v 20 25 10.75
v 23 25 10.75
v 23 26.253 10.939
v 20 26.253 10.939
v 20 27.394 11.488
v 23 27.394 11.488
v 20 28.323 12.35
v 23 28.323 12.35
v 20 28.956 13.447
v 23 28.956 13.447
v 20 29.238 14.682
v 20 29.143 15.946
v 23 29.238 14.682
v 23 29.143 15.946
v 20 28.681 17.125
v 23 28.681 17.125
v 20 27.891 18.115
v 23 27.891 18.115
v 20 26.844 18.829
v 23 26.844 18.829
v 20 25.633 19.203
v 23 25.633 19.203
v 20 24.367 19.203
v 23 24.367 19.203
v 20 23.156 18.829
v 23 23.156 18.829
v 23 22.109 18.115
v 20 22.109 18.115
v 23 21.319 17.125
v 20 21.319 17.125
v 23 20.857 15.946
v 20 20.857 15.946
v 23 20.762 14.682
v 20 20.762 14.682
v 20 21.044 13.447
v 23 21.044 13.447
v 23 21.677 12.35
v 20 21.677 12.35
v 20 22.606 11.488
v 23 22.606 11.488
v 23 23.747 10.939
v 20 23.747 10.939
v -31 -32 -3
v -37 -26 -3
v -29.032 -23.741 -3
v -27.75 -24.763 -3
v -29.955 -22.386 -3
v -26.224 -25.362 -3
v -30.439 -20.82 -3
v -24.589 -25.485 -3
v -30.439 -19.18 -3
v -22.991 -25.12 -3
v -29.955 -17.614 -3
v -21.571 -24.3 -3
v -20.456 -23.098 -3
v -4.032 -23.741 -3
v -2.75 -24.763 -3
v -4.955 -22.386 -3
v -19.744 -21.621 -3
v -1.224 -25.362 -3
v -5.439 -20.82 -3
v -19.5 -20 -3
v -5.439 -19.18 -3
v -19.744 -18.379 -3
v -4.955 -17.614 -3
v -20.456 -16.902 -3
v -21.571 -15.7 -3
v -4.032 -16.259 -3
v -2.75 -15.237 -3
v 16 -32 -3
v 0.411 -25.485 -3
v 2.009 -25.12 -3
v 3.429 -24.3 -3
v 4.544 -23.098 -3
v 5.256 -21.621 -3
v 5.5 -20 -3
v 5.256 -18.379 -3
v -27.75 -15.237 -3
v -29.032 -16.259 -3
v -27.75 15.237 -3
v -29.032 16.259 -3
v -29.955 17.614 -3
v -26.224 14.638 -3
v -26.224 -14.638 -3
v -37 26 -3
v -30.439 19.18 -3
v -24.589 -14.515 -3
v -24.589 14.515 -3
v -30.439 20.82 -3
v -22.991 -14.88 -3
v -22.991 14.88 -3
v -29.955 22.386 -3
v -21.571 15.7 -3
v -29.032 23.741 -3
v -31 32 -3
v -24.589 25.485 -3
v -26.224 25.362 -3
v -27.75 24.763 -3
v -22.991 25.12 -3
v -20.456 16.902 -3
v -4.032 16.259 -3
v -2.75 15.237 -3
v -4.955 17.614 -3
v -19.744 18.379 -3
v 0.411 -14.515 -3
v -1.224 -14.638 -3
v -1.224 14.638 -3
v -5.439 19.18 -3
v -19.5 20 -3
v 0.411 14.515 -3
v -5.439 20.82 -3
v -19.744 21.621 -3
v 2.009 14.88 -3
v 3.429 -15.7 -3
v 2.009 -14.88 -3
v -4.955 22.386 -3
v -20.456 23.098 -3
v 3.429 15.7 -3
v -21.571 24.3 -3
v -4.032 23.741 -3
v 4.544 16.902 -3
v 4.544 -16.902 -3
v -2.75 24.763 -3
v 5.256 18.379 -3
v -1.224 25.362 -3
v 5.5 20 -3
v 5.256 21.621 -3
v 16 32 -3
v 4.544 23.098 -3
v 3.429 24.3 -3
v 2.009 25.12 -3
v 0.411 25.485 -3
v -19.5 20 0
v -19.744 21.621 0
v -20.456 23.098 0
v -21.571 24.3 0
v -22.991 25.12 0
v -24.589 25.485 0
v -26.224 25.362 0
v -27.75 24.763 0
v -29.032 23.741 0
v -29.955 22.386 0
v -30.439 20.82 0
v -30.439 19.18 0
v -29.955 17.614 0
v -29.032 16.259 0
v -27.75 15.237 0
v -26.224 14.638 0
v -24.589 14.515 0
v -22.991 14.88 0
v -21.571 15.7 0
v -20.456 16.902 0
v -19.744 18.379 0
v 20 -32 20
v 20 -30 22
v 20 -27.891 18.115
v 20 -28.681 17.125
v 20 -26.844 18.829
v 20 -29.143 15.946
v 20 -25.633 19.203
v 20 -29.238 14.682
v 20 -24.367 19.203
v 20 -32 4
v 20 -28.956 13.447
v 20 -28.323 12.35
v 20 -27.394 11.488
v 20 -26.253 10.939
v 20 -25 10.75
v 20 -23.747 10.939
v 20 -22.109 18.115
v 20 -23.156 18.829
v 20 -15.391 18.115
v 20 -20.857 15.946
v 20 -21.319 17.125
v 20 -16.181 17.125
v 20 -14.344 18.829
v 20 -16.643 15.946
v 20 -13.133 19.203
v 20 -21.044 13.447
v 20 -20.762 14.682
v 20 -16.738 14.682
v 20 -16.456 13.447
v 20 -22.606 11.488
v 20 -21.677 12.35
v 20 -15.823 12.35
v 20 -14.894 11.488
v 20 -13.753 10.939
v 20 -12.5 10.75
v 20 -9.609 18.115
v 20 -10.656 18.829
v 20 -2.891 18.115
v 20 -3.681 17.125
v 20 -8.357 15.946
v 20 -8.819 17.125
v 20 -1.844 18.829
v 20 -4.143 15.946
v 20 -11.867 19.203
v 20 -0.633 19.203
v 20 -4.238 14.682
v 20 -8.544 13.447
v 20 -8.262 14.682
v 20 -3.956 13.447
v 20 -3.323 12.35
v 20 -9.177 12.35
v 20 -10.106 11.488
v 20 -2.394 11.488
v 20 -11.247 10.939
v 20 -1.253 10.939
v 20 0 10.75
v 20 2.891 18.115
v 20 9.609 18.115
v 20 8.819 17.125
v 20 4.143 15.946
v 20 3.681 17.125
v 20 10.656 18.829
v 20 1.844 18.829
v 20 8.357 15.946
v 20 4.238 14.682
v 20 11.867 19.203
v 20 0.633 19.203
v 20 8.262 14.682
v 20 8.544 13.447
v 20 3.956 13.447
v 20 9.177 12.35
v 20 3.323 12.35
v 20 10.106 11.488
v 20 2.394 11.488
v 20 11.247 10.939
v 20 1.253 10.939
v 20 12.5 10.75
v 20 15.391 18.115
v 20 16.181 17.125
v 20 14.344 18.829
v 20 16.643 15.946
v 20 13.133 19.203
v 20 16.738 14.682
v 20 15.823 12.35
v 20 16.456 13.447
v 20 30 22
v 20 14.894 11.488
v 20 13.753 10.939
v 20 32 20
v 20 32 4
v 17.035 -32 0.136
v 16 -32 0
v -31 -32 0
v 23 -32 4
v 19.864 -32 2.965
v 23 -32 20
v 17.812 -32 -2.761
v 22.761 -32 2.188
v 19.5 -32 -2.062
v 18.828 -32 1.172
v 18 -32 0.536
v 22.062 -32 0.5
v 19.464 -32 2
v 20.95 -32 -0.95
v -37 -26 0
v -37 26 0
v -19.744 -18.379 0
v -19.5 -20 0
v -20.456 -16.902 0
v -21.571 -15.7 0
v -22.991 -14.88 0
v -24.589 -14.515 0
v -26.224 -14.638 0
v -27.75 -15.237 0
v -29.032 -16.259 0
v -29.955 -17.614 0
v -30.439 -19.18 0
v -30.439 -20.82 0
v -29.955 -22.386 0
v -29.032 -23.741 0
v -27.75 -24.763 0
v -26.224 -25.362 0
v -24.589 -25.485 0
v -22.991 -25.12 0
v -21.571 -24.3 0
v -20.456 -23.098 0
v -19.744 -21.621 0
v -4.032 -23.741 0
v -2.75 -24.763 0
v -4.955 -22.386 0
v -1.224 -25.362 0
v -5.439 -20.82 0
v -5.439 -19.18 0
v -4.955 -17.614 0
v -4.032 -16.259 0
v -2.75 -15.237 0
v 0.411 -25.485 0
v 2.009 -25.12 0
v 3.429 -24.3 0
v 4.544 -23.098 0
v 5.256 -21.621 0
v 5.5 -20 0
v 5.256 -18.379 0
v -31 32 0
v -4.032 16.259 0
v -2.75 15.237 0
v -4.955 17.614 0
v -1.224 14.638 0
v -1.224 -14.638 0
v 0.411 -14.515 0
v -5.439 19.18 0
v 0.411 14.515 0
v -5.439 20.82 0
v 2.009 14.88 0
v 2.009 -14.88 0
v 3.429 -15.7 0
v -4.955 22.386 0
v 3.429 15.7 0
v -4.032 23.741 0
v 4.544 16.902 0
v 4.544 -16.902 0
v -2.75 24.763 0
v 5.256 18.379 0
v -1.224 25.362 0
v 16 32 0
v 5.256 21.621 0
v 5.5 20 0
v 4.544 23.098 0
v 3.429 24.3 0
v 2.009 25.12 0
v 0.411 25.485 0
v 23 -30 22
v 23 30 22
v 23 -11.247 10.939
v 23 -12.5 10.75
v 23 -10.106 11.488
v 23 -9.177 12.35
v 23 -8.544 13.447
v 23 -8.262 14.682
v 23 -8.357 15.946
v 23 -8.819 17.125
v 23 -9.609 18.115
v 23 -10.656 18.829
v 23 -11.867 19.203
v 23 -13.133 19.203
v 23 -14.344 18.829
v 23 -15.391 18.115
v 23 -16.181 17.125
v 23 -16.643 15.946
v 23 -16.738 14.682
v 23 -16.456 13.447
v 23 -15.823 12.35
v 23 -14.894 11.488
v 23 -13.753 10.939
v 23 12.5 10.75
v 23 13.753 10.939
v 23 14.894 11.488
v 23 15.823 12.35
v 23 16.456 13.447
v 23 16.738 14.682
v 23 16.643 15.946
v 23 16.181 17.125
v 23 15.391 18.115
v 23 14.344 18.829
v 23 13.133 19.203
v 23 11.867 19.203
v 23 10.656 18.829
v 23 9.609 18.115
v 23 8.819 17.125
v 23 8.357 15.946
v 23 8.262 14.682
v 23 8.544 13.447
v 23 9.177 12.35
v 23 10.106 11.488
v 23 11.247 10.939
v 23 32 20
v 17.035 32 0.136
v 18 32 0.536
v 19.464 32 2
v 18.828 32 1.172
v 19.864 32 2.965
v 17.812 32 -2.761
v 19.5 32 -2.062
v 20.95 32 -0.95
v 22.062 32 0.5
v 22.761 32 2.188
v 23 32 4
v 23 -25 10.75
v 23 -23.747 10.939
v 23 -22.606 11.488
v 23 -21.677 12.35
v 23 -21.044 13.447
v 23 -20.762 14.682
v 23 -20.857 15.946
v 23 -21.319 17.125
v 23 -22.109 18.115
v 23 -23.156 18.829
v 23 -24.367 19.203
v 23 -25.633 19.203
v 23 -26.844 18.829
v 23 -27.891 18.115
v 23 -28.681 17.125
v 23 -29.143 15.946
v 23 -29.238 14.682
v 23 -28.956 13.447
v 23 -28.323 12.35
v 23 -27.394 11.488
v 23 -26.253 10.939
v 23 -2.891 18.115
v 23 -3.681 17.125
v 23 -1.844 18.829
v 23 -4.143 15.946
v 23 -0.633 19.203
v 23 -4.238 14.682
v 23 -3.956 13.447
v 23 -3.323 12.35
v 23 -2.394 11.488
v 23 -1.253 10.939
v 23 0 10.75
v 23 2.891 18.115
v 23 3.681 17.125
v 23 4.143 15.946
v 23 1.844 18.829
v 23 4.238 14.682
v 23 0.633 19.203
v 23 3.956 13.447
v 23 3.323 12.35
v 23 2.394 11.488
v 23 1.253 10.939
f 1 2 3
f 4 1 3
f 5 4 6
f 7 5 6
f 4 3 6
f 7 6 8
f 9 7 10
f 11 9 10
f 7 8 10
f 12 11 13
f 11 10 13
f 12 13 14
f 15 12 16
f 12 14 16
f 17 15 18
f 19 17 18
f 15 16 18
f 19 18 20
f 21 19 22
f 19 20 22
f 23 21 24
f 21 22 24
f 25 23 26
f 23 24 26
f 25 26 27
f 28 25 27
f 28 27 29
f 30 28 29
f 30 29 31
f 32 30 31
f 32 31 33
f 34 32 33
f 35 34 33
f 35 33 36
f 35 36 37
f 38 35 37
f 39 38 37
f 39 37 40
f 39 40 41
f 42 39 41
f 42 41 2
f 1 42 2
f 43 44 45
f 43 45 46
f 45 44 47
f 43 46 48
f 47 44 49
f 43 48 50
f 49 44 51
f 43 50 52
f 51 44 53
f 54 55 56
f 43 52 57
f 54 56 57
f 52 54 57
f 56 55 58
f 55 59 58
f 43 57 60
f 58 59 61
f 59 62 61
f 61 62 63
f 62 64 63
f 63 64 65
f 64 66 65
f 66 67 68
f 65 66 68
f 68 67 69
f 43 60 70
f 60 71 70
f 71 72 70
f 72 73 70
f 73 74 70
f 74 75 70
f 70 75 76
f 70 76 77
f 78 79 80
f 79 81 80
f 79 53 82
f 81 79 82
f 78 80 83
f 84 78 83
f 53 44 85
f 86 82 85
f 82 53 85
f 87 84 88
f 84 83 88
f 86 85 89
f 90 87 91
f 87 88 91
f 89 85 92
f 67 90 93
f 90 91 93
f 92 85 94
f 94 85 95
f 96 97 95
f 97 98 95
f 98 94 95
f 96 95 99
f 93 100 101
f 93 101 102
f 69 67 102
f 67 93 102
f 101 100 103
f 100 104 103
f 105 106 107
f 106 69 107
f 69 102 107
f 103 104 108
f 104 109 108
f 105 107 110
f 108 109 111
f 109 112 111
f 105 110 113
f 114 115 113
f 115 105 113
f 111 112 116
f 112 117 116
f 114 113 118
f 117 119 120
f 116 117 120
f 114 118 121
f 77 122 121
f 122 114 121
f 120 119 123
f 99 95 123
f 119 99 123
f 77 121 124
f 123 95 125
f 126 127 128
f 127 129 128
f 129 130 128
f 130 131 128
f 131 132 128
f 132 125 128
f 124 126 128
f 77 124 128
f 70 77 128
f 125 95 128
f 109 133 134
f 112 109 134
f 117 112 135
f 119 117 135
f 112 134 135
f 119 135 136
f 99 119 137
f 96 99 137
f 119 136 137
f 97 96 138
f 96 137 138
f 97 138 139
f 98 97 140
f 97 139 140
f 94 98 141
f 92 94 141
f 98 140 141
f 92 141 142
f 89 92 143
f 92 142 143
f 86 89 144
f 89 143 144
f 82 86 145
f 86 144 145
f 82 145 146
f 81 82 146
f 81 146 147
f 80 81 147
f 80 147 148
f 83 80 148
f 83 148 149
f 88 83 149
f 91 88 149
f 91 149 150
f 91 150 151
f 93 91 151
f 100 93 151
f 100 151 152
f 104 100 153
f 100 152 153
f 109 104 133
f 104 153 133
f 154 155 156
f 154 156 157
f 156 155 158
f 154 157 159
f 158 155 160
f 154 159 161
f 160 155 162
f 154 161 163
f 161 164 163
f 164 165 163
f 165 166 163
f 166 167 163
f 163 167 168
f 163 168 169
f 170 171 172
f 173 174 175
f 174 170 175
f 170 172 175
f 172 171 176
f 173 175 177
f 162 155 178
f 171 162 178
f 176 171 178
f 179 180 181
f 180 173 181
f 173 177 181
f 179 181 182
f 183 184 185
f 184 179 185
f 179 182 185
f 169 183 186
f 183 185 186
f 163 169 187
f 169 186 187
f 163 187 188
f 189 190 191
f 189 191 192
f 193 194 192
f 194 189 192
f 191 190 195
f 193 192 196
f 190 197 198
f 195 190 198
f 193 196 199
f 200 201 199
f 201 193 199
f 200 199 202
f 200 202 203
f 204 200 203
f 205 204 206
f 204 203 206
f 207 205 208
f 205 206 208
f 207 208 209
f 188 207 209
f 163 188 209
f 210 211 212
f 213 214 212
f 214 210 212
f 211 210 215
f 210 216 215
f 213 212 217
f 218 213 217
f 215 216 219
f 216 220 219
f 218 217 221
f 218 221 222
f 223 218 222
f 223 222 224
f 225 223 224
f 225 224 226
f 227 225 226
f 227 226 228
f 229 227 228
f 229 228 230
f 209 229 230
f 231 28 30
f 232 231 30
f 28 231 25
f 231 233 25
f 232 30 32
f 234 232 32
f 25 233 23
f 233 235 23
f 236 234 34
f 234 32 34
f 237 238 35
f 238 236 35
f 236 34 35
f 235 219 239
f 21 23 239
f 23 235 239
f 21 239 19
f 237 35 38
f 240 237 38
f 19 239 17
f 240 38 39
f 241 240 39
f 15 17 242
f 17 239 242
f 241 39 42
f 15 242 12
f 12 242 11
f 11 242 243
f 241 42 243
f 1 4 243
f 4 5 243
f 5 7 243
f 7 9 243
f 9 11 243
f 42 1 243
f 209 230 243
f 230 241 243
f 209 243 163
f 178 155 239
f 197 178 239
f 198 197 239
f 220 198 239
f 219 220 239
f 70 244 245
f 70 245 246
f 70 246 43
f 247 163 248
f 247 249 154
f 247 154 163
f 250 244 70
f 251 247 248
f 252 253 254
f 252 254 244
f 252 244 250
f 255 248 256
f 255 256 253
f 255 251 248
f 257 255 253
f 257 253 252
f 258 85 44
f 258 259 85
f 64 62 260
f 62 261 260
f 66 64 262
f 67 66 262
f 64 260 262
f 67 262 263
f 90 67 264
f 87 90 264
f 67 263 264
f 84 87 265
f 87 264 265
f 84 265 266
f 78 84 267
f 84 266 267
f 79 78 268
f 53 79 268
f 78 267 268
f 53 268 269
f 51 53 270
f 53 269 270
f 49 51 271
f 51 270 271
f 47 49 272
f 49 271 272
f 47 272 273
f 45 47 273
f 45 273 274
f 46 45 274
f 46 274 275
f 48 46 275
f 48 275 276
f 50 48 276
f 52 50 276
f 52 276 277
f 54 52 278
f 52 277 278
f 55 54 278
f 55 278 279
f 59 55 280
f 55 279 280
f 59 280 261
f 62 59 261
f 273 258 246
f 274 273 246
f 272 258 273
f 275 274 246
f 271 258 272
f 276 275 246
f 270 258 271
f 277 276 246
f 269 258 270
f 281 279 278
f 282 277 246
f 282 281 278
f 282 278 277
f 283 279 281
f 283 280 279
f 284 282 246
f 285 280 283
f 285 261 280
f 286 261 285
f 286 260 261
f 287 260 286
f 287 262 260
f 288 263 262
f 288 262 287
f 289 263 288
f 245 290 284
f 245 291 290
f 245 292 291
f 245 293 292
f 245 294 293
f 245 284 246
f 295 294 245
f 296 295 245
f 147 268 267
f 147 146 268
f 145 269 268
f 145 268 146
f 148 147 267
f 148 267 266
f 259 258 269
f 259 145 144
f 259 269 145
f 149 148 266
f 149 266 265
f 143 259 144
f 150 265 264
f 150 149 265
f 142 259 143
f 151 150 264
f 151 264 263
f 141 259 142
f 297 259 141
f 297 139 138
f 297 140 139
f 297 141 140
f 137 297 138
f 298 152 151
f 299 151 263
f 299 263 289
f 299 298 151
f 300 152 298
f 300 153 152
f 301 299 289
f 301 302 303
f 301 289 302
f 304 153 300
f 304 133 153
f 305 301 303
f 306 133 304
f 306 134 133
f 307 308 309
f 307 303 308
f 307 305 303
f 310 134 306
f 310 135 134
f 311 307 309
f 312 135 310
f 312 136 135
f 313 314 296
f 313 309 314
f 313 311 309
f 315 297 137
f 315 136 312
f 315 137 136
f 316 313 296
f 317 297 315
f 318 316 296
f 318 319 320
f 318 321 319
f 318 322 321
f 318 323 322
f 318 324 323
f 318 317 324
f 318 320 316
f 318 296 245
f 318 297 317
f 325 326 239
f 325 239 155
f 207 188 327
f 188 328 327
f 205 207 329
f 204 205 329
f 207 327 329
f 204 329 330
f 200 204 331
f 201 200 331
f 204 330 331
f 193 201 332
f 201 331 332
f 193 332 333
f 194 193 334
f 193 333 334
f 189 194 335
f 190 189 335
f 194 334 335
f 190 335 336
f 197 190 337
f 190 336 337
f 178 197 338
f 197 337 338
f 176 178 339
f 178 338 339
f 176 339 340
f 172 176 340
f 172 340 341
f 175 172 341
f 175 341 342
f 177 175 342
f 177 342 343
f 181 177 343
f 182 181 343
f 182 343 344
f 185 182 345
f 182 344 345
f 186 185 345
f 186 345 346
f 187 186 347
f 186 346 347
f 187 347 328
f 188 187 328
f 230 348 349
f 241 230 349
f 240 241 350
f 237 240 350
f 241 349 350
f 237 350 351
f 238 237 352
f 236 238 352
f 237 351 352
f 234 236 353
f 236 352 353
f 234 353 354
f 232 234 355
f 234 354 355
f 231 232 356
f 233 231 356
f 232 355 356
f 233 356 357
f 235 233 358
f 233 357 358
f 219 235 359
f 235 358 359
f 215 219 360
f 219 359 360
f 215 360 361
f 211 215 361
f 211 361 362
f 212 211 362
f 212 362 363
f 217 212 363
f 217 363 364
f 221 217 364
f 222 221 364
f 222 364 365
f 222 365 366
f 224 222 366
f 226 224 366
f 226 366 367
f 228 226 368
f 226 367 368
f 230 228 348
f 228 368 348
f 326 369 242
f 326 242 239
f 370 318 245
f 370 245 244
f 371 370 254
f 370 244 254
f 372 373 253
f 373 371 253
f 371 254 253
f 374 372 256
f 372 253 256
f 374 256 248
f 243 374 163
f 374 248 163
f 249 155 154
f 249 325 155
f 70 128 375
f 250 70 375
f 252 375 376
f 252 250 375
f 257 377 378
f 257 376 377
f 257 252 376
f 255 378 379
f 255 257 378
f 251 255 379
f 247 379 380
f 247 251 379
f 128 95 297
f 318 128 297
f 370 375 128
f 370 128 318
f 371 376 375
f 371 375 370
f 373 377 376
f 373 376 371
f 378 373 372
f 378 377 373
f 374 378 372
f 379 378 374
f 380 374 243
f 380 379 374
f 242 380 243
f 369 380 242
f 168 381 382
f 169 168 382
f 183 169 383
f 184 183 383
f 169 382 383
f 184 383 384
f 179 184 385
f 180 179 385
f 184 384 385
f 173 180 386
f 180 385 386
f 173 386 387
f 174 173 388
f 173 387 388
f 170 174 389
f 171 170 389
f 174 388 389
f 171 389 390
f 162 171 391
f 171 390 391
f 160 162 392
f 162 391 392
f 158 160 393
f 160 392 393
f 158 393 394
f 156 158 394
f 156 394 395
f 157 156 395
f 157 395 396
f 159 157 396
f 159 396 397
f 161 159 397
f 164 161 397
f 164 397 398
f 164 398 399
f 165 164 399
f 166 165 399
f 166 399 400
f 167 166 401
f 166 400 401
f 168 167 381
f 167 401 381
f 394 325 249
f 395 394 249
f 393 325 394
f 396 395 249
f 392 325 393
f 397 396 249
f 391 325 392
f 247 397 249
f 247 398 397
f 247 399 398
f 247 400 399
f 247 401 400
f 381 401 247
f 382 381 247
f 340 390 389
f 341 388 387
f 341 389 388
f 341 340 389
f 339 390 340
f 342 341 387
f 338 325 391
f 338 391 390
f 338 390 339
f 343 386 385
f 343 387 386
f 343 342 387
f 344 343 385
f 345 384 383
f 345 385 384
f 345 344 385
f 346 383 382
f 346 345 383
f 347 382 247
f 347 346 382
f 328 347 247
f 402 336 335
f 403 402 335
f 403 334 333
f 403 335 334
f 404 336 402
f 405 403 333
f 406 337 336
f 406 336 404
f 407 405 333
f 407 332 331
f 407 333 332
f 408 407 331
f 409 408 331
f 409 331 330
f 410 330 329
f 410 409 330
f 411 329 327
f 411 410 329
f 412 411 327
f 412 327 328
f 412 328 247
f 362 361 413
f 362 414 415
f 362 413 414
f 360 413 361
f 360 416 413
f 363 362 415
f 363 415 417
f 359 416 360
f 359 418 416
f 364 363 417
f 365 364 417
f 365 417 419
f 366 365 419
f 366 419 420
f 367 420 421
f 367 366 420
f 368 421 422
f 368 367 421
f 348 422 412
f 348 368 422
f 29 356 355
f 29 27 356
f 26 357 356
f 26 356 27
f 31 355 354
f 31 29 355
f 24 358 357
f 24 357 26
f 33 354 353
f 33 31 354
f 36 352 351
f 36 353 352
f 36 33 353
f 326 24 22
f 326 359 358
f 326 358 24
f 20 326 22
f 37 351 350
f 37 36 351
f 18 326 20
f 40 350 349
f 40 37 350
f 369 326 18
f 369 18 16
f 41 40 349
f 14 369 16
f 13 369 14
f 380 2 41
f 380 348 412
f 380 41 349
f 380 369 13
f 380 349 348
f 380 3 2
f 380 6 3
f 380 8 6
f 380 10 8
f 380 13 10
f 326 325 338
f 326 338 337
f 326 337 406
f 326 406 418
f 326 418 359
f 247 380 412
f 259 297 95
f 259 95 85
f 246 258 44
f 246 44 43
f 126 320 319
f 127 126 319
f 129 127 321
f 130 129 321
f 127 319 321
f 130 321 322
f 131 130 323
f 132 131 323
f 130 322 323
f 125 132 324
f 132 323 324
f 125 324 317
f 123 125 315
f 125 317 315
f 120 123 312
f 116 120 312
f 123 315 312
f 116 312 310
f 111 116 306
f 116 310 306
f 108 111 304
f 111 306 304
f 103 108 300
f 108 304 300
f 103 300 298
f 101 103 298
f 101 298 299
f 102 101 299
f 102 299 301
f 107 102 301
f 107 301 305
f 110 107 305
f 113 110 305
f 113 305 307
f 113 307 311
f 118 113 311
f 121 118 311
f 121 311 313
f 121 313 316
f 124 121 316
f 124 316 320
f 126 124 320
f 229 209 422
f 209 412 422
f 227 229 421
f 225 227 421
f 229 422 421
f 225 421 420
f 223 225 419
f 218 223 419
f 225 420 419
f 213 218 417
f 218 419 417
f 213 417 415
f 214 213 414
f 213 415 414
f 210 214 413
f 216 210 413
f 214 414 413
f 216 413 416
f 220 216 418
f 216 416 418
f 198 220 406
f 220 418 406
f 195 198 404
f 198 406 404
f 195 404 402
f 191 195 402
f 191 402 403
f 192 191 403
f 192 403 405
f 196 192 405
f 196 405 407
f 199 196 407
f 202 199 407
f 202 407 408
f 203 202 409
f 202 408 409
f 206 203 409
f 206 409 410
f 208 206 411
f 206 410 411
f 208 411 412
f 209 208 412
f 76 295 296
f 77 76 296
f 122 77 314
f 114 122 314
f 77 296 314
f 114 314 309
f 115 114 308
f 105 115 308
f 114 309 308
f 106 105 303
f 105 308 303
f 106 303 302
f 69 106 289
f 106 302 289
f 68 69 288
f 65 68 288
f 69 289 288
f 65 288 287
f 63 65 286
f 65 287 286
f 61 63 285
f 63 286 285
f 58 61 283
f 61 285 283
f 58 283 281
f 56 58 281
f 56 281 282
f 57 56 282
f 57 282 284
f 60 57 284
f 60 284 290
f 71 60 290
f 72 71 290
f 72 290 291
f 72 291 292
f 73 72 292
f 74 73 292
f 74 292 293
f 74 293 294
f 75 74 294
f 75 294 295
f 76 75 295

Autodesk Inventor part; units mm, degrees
sketch "Sketch_8" plane through (0, 0, 0) normal (0, 0, 1) x (1, 0, 0)
  line L0 (-37, 26) -> (-37, -26)
  line L1 (-37, -26) -> (-31, -32)
  line L2 (-31, -32) -> (16, -32)
  line L3 (16, -32) -> (16, 32)
  line L4 (16, 32) -> (-31, 32)
  line L5 (-31, 32) -> (-37, 26)
  circle A0 centre (0, -20) radius 5.5
  circle A1 centre (0, 20) radius 5.5
  circle A2 centre (-25, -20) radius 5.5
  circle A3 centre (-25, 20) radius 5.5
extrude "Extrusion1" add sketch "Sketch_8" against normal blind 3
sketch "Sketch_1" plane through (0, 0, 0) normal (0, 1, 0) x (1, 0, 0)
  arc A0 (20, -4) -> (16, 0) centre (16, -4) ccw
  line L0 (20, -4) -> (23, -4)
  arc A1 (23, -4) -> (16, 3) centre (16, -4) ccw
  line L1 (16, 3) -> (16, 0)
extrude "Extrusion2" add sketch "Sketch_1" along normal mid plane 64
sketch "Sketch_2" plane through (23, 0, 0) normal (1, 0, 0) x (0, 0, -1)
  line L0 (-22, -30) -> (-20, -32)
  line L1 (-20, -32) -> (-4, -32)
  line L2 (-4, -32) -> (-4, 32)
  line L3 (-4, 32) -> (-20, 32)
  line L4 (-20, 32) -> (-22, 30)
  line L5 (-22, 30) -> (-22, -30)
  circle A0 centre (-15, -25) radius 4.25
  circle A1 centre (-15, -12.5) radius 4.25
  circle A2 centre (-15, 0) radius 4.25
  circle A3 centre (-15, 12.5) radius 4.25
  circle A4 centre (-15, 25) radius 4.25
extrude "Extrusion3" add sketch "Sketch_2" against normal blind 3
ref_plane "P21_XY" through (0, 20, 0) normal (0, 0, -1) x (1, 0, 0)
ref_plane "P21_YZ" through (0, 20, 0) normal (1, 0, 0) x (0, -1, 0)
ref_plane "P21_ZX" through (0, 20, 0) normal (0, -1, 0) x (0, 0, -1)
ref_plane "P22_XY" through (0, -20, 0) normal (0, 0, -1) x (1, 0, 0)
ref_plane "P22_YZ" through (0, -20, 0) normal (1, 0, 0) x (0, -1, 0)
ref_plane "P22_ZX" through (0, -20, 0) normal (0, -1, 0) x (0, 0, -1)
properties part number "8617.540_P2"
